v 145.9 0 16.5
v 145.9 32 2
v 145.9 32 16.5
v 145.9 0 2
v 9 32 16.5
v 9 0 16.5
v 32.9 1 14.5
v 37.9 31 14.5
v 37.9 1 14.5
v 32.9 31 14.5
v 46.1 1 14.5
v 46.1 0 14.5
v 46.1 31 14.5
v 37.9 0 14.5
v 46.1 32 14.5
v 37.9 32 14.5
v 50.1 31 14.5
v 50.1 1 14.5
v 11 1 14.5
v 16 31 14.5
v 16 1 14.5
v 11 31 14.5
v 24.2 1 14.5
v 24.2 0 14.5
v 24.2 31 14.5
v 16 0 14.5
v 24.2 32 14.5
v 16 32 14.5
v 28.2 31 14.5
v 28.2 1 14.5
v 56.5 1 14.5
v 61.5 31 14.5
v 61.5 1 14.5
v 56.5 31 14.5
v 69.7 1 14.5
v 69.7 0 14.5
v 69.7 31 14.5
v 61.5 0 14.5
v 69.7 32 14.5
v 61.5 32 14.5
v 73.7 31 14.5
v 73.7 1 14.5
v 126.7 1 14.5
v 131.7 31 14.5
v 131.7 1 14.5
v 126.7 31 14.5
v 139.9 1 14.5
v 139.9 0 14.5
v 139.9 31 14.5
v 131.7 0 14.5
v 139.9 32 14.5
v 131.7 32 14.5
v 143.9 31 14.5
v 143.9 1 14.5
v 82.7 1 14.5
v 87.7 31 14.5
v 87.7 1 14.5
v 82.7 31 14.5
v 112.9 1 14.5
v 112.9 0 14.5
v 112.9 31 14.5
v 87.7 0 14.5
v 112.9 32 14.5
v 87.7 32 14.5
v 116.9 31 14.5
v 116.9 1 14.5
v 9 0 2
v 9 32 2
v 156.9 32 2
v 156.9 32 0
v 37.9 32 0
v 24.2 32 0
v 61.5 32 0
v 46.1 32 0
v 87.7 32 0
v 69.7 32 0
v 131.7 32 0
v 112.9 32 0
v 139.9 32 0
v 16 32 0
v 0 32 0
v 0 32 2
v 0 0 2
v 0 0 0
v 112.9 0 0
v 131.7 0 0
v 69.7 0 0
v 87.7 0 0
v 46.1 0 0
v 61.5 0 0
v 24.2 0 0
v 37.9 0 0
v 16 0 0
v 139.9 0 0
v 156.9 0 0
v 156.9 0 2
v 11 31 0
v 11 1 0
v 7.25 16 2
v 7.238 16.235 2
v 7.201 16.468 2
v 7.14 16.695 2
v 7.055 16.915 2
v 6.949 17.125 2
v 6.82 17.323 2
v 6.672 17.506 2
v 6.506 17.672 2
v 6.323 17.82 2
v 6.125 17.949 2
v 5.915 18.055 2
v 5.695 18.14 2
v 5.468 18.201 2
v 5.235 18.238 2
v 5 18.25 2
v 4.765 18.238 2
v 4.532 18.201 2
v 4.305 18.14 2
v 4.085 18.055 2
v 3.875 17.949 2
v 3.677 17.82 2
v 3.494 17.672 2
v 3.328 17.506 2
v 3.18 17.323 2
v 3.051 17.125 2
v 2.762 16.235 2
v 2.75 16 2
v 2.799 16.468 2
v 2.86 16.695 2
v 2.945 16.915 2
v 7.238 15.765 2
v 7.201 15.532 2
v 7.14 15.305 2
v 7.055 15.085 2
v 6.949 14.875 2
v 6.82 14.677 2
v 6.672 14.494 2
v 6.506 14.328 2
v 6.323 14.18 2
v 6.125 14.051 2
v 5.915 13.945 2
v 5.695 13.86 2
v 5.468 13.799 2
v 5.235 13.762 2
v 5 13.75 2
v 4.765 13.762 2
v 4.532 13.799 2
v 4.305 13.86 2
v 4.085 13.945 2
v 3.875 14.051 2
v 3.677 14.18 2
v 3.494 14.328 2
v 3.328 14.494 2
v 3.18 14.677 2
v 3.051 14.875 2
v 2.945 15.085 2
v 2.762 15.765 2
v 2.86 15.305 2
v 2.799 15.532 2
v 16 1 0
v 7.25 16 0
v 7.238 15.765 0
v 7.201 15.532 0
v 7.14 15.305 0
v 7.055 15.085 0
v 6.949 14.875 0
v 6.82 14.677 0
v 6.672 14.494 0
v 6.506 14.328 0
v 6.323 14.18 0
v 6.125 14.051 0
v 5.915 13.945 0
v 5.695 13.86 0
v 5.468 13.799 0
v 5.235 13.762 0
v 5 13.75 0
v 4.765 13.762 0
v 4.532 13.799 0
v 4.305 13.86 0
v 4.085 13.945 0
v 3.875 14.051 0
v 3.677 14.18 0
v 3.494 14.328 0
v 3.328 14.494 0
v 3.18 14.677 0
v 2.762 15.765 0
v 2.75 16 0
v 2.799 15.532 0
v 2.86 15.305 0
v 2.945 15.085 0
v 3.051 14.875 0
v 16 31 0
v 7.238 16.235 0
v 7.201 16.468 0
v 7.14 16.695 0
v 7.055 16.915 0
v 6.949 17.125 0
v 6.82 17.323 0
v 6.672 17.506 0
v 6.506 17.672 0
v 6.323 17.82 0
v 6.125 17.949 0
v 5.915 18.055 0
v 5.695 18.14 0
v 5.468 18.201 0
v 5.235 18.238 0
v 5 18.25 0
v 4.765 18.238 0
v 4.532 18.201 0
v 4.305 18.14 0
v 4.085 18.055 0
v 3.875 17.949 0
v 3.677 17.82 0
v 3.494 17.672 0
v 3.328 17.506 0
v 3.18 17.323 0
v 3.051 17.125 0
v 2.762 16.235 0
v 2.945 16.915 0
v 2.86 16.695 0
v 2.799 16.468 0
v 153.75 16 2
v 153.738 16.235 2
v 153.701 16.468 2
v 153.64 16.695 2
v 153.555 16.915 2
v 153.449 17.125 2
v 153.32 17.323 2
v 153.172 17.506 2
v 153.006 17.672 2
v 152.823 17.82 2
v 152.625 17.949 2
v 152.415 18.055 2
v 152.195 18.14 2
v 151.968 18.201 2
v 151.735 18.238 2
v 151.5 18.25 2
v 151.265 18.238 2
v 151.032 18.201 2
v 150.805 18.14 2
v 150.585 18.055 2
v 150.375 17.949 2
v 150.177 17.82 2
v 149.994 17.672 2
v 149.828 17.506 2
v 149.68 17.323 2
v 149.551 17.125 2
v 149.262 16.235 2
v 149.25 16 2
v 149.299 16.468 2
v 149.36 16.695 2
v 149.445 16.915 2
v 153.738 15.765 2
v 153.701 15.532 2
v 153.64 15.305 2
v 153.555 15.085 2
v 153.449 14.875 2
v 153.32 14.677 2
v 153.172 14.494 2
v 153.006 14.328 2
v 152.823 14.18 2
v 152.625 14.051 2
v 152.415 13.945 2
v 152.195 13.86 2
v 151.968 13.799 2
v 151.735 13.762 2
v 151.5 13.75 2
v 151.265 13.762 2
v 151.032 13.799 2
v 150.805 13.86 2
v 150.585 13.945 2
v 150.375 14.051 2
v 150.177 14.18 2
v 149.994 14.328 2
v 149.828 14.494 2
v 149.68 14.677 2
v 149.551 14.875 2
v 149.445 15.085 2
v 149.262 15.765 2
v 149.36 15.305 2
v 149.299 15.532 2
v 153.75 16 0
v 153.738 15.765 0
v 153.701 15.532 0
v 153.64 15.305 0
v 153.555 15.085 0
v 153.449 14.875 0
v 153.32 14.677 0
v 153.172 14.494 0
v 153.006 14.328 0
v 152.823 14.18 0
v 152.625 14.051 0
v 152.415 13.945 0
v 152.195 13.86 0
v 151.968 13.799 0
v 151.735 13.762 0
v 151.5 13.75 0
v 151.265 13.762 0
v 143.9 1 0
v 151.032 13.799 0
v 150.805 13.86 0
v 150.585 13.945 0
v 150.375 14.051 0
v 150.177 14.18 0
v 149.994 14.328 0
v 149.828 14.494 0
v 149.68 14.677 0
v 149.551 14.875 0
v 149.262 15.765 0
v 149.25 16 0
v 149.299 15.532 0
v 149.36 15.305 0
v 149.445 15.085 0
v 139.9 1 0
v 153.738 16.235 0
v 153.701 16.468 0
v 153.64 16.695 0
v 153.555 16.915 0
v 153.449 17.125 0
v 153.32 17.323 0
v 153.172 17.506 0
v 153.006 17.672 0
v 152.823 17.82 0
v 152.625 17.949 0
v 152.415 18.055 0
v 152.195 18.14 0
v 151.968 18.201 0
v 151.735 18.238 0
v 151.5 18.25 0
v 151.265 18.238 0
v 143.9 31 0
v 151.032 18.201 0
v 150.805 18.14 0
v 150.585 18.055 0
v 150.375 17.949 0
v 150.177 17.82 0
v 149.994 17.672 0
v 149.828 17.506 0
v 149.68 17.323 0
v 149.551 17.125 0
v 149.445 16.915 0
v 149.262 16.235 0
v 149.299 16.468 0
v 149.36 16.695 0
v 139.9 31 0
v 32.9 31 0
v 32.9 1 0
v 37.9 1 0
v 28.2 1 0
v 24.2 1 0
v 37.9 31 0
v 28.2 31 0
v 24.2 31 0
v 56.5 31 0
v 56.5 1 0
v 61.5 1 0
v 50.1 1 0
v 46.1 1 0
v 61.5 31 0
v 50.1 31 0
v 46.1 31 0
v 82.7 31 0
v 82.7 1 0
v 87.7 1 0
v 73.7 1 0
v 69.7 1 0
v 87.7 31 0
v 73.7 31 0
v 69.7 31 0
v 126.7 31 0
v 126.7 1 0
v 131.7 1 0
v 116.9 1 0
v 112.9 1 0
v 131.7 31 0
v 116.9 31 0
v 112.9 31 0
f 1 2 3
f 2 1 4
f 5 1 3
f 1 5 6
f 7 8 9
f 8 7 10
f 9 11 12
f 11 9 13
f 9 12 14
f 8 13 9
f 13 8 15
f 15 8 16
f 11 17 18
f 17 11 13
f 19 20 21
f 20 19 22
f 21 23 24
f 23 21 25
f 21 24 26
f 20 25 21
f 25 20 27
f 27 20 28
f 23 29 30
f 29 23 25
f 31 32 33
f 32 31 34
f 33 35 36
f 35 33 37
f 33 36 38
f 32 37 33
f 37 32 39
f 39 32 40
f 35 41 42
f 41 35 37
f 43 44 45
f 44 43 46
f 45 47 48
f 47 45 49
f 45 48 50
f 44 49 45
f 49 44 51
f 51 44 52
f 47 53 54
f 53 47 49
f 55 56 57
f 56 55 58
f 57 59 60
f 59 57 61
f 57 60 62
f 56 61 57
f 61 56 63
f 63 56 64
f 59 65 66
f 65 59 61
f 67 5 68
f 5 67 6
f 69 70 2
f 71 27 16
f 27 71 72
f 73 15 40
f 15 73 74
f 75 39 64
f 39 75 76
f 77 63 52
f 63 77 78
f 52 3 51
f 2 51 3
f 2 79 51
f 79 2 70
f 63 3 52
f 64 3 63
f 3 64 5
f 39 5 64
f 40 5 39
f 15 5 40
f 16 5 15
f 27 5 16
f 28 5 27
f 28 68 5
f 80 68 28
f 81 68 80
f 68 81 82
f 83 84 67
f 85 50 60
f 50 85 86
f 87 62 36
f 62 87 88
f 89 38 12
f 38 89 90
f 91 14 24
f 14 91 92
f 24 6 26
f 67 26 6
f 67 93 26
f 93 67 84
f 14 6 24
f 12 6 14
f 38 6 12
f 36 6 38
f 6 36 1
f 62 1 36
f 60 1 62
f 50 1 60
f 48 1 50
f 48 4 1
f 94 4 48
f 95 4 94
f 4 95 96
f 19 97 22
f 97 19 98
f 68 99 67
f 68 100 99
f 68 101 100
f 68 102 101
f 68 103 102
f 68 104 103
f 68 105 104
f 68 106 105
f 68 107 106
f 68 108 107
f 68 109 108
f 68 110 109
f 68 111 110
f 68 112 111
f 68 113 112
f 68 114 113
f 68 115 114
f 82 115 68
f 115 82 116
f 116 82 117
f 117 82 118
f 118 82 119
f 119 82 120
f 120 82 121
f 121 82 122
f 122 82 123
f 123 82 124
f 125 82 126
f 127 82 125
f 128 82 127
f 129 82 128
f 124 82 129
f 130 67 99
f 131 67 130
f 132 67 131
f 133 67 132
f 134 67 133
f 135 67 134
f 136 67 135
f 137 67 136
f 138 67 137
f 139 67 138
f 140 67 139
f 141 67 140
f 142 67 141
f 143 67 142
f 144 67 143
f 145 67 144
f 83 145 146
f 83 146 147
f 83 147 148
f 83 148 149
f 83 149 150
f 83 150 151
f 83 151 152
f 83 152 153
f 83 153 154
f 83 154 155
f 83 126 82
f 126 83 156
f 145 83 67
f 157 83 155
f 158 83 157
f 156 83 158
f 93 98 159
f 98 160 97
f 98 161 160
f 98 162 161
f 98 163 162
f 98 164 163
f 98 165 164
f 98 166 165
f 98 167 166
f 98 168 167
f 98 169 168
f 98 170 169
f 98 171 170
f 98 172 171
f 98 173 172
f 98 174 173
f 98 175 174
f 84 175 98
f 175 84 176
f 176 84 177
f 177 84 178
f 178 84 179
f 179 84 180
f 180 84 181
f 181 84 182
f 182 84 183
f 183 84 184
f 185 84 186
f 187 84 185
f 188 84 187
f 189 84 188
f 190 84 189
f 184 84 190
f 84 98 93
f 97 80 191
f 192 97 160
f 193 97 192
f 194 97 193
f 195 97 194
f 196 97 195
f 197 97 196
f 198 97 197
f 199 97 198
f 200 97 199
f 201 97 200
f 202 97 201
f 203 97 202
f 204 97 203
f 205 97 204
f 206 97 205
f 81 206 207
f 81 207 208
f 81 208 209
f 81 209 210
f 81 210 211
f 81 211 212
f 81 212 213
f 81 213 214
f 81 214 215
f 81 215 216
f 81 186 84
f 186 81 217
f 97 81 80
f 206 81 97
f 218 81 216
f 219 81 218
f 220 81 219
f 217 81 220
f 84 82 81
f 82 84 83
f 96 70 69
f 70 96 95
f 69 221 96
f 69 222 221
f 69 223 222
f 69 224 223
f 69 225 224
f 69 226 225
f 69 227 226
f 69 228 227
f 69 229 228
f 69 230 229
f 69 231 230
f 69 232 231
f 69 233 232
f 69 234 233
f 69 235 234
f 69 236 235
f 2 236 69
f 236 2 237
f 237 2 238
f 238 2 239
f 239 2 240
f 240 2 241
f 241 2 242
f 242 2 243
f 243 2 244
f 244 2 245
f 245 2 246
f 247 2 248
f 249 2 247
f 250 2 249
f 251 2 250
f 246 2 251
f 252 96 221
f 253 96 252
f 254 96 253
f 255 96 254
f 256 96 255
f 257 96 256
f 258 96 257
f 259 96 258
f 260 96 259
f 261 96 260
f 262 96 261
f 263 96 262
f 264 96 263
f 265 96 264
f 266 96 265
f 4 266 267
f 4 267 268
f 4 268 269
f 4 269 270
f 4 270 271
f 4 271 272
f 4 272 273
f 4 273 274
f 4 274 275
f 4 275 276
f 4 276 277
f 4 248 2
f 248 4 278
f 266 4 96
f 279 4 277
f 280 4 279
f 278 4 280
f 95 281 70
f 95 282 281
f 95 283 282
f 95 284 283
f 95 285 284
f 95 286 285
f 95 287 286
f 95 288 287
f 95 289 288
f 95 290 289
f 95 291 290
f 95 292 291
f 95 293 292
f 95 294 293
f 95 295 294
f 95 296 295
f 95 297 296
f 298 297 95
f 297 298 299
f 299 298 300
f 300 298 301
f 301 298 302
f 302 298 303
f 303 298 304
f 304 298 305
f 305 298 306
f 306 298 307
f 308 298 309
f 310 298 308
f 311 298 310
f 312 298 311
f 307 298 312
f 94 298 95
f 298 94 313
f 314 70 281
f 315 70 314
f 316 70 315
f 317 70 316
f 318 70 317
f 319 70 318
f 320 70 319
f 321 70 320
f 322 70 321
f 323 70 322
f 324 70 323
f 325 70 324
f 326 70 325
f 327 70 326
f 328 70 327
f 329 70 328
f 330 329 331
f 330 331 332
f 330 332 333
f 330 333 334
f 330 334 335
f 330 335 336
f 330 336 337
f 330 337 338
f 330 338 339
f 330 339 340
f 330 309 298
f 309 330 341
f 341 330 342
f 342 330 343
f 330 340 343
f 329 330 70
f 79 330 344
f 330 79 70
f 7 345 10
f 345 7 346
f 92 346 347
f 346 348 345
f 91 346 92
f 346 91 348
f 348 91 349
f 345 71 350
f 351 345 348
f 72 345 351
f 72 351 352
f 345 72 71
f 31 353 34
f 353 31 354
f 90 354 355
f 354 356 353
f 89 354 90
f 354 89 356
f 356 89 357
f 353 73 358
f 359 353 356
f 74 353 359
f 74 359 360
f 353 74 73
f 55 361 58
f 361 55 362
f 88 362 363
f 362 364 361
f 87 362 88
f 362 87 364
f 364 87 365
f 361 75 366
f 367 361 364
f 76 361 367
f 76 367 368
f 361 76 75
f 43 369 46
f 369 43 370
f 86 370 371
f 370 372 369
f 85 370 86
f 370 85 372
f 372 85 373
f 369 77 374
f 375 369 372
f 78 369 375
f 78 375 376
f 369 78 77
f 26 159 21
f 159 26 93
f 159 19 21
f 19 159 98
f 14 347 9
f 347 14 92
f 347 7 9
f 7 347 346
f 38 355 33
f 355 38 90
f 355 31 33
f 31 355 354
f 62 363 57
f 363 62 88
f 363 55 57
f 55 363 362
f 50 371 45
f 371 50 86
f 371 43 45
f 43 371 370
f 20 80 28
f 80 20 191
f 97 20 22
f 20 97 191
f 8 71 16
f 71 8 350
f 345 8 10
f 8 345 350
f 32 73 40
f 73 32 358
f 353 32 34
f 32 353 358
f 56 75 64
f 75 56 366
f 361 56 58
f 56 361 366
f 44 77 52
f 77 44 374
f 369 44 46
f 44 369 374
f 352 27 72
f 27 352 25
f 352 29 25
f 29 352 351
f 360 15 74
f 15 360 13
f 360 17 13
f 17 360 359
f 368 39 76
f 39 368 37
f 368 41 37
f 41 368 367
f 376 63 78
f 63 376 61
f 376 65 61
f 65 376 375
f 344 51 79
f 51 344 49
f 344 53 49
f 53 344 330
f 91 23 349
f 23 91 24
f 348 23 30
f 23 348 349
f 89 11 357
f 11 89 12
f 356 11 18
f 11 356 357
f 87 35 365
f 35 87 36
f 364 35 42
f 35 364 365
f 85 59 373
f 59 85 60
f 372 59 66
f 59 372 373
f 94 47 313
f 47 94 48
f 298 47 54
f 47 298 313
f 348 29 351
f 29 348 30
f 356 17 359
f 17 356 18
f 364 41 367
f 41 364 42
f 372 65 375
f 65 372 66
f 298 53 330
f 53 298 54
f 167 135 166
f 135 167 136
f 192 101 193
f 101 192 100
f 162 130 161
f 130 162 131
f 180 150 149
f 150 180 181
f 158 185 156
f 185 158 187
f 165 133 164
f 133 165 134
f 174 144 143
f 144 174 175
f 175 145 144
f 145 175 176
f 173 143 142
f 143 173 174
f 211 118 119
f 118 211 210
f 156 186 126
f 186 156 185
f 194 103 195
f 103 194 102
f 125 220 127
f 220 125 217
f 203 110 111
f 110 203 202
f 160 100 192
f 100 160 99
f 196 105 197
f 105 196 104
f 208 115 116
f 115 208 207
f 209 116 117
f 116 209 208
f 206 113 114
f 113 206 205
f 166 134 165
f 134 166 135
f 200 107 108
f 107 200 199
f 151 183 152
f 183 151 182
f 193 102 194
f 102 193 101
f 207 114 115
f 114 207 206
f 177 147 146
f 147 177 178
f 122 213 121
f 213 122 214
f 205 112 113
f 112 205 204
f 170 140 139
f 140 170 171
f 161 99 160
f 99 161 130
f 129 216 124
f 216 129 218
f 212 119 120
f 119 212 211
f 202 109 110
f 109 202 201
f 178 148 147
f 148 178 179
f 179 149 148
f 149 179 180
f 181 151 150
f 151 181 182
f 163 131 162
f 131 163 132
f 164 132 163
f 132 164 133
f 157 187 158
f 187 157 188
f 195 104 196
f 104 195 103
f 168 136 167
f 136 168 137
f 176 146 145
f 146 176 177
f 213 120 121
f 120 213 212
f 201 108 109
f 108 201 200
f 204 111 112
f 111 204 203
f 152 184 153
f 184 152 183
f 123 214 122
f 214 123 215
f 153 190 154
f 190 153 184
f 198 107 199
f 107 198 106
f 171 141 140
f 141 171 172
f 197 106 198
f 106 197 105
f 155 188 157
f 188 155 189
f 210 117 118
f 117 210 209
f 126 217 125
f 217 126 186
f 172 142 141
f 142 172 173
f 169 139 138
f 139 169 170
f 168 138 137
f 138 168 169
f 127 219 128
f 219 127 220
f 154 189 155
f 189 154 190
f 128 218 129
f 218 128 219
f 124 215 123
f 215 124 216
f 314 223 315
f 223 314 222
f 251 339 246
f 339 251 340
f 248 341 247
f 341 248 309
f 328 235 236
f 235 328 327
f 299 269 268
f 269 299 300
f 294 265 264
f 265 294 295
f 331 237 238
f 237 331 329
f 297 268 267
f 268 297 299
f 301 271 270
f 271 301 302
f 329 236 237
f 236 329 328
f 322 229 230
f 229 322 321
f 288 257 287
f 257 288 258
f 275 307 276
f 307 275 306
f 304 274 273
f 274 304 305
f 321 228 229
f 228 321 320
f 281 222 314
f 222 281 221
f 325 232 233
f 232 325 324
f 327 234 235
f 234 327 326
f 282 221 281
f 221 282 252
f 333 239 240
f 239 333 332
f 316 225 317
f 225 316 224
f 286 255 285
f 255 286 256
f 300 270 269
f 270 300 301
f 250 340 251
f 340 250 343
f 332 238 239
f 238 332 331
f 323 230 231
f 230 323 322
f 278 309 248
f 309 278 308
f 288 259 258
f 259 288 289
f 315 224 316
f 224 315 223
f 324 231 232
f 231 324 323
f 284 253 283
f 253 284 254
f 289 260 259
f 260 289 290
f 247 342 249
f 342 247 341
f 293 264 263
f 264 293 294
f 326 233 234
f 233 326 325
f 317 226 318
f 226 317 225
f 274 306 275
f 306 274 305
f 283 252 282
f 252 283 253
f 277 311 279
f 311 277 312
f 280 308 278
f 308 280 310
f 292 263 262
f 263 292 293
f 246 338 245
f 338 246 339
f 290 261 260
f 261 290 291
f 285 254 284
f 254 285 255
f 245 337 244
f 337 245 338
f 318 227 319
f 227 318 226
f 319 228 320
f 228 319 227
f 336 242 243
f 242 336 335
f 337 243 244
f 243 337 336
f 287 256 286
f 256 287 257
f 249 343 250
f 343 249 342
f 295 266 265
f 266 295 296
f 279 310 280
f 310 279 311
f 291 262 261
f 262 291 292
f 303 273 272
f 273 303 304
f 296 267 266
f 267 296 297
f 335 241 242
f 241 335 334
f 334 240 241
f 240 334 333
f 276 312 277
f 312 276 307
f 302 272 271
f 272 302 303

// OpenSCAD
    // U Bracket - Corrected version for Tinkercad / OpenSCAD 
    // Dimensions in mm

    difference() {
        // Main solid U-shape
        union() {
            // tran
            translate([9, 0, 14.5])
                cube([136.9, 32, 2], center = false);
            // day trai
            cube([11, 32, 2], center = false);
            // day phai
            translate([145.9, 0, 0])
                cube([11, 32, 2], center = false);
            // Side walls connecting to middle
            //le trai 1
            translate([9, 0, 0])
                cube([2, 32, 14.5], center = false);
                //le trai 2
            translate([30.2, 0, 0])
                cube([2.7, 32, 14.5], center = false);
                    //le trai 3
            translate([52.1, 0, 0])
                cube([4.4, 32, 14.5], center = false);
                        //le trai 4
            translate([75.7, 0, 0])
                cube([7, 32, 14.5], center = false);
                            //le trai 5
            translate([118.9, 0, 0])
                cube([7.8, 32, 14.5], center = false);
            //mep trai duoi 1
            translate([11, 0, 0])
                cube([5, 1, 14.5], center = false);
                //mep trai duoi 2
            translate([32.9, 0, 0])
                cube([5, 1, 14.5], center = false);
                    //mep trai duoi 3
            translate([56.5, 0, 0])
                cube([5, 1, 14.5], center = false);
                        //mep trai duoi 4
            translate([82.7, 0, 0])
                cube([5, 1, 14.5], center = false);
                            //mep trai duoi 5
            translate([126.7, 0, 0])
                cube([5, 1, 14.5], center = false);
            //mep trai tren 1
            translate([11, 31, 0])
                cube([5, 1, 14.5], center = false);
                //mep trai tren 2
            translate([32.9, 31, 0])
                cube([5, 1, 14.5], center = false);
                    //mep trai tren 3
            translate([56.5, 31, 0])
                cube([5, 1, 14.5], center = false);
                        //mep trai tren 4
            translate([82.7, 31, 0])
                cube([5, 1, 14.5], center = false);
                            //mep trai tren 5
            translate([126.7, 31, 0])
                cube([5, 1, 14.5], center = false);
            //mep phai tren 1
            translate([24.2, 31, 0])
                cube([5, 1, 14.5], center = false);
                //mep phai tren 2
            translate([46.1, 31, 0])
                cube([5, 1, 14.5], center = false);
                    //mep phai tren 3
            translate([69.7, 31, 0])
                cube([5, 1, 14.5], center = false);
                        //mep phai tren 4
            translate([112.9, 31, 0])
                cube([5, 1, 14.5], center = false);
                            //mep phai tren 5
            translate([139.9, 31, 0])
                cube([5, 1, 14.5], center = false);
            //mep phai duoi 1
            translate([24.2, 0, 0])
                cube([5, 1, 14.5], center = false);
                //mep phai duoi 2
            translate([46.1, 0, 0])
                cube([5, 1, 14.5], center = false);
                    //mep phai duoi 3
            translate([69.7, 0, 0])
                cube([5, 1, 14.5], center = false);
                        //mep phai duoi 4
            translate([112.9, 0, 0])
                cube([5, 1, 14.5], center = false);
                            //mep phai duoi 5
            translate([139.9, 0, 0])
                cube([5, 1, 14.5], center = false);
            //le phai 1
            translate([28.2, 0, 0])
                cube([2, 32, 14.5], center = false);
                //le phai 2
            translate([50.1, 0, 0])
                cube([2, 32, 14.5], center = false);
                    //le phai 3
            translate([73.7, 0, 0])
                cube([2, 32, 14.5], center = false);
                        //le phai 4
            translate([116.9, 0, 0])
                cube([2, 32, 14.5], center = false);
                            //le phai 5
            translate([143.9, 0, 0])
                cube([2, 32, 14.5], center = false);
        }

        // Holes for M4 bolts (Ø4.5 mm)
        //lo trai
        translate([5, 16, 1])
            cylinder(h = 4, r = 2.25, center = true, $fn = 60);
        //lo phai
        translate([151.5, 16, 1])
            cylinder(h = 4, r = 2.25, center = true, $fn = 60);
    }
